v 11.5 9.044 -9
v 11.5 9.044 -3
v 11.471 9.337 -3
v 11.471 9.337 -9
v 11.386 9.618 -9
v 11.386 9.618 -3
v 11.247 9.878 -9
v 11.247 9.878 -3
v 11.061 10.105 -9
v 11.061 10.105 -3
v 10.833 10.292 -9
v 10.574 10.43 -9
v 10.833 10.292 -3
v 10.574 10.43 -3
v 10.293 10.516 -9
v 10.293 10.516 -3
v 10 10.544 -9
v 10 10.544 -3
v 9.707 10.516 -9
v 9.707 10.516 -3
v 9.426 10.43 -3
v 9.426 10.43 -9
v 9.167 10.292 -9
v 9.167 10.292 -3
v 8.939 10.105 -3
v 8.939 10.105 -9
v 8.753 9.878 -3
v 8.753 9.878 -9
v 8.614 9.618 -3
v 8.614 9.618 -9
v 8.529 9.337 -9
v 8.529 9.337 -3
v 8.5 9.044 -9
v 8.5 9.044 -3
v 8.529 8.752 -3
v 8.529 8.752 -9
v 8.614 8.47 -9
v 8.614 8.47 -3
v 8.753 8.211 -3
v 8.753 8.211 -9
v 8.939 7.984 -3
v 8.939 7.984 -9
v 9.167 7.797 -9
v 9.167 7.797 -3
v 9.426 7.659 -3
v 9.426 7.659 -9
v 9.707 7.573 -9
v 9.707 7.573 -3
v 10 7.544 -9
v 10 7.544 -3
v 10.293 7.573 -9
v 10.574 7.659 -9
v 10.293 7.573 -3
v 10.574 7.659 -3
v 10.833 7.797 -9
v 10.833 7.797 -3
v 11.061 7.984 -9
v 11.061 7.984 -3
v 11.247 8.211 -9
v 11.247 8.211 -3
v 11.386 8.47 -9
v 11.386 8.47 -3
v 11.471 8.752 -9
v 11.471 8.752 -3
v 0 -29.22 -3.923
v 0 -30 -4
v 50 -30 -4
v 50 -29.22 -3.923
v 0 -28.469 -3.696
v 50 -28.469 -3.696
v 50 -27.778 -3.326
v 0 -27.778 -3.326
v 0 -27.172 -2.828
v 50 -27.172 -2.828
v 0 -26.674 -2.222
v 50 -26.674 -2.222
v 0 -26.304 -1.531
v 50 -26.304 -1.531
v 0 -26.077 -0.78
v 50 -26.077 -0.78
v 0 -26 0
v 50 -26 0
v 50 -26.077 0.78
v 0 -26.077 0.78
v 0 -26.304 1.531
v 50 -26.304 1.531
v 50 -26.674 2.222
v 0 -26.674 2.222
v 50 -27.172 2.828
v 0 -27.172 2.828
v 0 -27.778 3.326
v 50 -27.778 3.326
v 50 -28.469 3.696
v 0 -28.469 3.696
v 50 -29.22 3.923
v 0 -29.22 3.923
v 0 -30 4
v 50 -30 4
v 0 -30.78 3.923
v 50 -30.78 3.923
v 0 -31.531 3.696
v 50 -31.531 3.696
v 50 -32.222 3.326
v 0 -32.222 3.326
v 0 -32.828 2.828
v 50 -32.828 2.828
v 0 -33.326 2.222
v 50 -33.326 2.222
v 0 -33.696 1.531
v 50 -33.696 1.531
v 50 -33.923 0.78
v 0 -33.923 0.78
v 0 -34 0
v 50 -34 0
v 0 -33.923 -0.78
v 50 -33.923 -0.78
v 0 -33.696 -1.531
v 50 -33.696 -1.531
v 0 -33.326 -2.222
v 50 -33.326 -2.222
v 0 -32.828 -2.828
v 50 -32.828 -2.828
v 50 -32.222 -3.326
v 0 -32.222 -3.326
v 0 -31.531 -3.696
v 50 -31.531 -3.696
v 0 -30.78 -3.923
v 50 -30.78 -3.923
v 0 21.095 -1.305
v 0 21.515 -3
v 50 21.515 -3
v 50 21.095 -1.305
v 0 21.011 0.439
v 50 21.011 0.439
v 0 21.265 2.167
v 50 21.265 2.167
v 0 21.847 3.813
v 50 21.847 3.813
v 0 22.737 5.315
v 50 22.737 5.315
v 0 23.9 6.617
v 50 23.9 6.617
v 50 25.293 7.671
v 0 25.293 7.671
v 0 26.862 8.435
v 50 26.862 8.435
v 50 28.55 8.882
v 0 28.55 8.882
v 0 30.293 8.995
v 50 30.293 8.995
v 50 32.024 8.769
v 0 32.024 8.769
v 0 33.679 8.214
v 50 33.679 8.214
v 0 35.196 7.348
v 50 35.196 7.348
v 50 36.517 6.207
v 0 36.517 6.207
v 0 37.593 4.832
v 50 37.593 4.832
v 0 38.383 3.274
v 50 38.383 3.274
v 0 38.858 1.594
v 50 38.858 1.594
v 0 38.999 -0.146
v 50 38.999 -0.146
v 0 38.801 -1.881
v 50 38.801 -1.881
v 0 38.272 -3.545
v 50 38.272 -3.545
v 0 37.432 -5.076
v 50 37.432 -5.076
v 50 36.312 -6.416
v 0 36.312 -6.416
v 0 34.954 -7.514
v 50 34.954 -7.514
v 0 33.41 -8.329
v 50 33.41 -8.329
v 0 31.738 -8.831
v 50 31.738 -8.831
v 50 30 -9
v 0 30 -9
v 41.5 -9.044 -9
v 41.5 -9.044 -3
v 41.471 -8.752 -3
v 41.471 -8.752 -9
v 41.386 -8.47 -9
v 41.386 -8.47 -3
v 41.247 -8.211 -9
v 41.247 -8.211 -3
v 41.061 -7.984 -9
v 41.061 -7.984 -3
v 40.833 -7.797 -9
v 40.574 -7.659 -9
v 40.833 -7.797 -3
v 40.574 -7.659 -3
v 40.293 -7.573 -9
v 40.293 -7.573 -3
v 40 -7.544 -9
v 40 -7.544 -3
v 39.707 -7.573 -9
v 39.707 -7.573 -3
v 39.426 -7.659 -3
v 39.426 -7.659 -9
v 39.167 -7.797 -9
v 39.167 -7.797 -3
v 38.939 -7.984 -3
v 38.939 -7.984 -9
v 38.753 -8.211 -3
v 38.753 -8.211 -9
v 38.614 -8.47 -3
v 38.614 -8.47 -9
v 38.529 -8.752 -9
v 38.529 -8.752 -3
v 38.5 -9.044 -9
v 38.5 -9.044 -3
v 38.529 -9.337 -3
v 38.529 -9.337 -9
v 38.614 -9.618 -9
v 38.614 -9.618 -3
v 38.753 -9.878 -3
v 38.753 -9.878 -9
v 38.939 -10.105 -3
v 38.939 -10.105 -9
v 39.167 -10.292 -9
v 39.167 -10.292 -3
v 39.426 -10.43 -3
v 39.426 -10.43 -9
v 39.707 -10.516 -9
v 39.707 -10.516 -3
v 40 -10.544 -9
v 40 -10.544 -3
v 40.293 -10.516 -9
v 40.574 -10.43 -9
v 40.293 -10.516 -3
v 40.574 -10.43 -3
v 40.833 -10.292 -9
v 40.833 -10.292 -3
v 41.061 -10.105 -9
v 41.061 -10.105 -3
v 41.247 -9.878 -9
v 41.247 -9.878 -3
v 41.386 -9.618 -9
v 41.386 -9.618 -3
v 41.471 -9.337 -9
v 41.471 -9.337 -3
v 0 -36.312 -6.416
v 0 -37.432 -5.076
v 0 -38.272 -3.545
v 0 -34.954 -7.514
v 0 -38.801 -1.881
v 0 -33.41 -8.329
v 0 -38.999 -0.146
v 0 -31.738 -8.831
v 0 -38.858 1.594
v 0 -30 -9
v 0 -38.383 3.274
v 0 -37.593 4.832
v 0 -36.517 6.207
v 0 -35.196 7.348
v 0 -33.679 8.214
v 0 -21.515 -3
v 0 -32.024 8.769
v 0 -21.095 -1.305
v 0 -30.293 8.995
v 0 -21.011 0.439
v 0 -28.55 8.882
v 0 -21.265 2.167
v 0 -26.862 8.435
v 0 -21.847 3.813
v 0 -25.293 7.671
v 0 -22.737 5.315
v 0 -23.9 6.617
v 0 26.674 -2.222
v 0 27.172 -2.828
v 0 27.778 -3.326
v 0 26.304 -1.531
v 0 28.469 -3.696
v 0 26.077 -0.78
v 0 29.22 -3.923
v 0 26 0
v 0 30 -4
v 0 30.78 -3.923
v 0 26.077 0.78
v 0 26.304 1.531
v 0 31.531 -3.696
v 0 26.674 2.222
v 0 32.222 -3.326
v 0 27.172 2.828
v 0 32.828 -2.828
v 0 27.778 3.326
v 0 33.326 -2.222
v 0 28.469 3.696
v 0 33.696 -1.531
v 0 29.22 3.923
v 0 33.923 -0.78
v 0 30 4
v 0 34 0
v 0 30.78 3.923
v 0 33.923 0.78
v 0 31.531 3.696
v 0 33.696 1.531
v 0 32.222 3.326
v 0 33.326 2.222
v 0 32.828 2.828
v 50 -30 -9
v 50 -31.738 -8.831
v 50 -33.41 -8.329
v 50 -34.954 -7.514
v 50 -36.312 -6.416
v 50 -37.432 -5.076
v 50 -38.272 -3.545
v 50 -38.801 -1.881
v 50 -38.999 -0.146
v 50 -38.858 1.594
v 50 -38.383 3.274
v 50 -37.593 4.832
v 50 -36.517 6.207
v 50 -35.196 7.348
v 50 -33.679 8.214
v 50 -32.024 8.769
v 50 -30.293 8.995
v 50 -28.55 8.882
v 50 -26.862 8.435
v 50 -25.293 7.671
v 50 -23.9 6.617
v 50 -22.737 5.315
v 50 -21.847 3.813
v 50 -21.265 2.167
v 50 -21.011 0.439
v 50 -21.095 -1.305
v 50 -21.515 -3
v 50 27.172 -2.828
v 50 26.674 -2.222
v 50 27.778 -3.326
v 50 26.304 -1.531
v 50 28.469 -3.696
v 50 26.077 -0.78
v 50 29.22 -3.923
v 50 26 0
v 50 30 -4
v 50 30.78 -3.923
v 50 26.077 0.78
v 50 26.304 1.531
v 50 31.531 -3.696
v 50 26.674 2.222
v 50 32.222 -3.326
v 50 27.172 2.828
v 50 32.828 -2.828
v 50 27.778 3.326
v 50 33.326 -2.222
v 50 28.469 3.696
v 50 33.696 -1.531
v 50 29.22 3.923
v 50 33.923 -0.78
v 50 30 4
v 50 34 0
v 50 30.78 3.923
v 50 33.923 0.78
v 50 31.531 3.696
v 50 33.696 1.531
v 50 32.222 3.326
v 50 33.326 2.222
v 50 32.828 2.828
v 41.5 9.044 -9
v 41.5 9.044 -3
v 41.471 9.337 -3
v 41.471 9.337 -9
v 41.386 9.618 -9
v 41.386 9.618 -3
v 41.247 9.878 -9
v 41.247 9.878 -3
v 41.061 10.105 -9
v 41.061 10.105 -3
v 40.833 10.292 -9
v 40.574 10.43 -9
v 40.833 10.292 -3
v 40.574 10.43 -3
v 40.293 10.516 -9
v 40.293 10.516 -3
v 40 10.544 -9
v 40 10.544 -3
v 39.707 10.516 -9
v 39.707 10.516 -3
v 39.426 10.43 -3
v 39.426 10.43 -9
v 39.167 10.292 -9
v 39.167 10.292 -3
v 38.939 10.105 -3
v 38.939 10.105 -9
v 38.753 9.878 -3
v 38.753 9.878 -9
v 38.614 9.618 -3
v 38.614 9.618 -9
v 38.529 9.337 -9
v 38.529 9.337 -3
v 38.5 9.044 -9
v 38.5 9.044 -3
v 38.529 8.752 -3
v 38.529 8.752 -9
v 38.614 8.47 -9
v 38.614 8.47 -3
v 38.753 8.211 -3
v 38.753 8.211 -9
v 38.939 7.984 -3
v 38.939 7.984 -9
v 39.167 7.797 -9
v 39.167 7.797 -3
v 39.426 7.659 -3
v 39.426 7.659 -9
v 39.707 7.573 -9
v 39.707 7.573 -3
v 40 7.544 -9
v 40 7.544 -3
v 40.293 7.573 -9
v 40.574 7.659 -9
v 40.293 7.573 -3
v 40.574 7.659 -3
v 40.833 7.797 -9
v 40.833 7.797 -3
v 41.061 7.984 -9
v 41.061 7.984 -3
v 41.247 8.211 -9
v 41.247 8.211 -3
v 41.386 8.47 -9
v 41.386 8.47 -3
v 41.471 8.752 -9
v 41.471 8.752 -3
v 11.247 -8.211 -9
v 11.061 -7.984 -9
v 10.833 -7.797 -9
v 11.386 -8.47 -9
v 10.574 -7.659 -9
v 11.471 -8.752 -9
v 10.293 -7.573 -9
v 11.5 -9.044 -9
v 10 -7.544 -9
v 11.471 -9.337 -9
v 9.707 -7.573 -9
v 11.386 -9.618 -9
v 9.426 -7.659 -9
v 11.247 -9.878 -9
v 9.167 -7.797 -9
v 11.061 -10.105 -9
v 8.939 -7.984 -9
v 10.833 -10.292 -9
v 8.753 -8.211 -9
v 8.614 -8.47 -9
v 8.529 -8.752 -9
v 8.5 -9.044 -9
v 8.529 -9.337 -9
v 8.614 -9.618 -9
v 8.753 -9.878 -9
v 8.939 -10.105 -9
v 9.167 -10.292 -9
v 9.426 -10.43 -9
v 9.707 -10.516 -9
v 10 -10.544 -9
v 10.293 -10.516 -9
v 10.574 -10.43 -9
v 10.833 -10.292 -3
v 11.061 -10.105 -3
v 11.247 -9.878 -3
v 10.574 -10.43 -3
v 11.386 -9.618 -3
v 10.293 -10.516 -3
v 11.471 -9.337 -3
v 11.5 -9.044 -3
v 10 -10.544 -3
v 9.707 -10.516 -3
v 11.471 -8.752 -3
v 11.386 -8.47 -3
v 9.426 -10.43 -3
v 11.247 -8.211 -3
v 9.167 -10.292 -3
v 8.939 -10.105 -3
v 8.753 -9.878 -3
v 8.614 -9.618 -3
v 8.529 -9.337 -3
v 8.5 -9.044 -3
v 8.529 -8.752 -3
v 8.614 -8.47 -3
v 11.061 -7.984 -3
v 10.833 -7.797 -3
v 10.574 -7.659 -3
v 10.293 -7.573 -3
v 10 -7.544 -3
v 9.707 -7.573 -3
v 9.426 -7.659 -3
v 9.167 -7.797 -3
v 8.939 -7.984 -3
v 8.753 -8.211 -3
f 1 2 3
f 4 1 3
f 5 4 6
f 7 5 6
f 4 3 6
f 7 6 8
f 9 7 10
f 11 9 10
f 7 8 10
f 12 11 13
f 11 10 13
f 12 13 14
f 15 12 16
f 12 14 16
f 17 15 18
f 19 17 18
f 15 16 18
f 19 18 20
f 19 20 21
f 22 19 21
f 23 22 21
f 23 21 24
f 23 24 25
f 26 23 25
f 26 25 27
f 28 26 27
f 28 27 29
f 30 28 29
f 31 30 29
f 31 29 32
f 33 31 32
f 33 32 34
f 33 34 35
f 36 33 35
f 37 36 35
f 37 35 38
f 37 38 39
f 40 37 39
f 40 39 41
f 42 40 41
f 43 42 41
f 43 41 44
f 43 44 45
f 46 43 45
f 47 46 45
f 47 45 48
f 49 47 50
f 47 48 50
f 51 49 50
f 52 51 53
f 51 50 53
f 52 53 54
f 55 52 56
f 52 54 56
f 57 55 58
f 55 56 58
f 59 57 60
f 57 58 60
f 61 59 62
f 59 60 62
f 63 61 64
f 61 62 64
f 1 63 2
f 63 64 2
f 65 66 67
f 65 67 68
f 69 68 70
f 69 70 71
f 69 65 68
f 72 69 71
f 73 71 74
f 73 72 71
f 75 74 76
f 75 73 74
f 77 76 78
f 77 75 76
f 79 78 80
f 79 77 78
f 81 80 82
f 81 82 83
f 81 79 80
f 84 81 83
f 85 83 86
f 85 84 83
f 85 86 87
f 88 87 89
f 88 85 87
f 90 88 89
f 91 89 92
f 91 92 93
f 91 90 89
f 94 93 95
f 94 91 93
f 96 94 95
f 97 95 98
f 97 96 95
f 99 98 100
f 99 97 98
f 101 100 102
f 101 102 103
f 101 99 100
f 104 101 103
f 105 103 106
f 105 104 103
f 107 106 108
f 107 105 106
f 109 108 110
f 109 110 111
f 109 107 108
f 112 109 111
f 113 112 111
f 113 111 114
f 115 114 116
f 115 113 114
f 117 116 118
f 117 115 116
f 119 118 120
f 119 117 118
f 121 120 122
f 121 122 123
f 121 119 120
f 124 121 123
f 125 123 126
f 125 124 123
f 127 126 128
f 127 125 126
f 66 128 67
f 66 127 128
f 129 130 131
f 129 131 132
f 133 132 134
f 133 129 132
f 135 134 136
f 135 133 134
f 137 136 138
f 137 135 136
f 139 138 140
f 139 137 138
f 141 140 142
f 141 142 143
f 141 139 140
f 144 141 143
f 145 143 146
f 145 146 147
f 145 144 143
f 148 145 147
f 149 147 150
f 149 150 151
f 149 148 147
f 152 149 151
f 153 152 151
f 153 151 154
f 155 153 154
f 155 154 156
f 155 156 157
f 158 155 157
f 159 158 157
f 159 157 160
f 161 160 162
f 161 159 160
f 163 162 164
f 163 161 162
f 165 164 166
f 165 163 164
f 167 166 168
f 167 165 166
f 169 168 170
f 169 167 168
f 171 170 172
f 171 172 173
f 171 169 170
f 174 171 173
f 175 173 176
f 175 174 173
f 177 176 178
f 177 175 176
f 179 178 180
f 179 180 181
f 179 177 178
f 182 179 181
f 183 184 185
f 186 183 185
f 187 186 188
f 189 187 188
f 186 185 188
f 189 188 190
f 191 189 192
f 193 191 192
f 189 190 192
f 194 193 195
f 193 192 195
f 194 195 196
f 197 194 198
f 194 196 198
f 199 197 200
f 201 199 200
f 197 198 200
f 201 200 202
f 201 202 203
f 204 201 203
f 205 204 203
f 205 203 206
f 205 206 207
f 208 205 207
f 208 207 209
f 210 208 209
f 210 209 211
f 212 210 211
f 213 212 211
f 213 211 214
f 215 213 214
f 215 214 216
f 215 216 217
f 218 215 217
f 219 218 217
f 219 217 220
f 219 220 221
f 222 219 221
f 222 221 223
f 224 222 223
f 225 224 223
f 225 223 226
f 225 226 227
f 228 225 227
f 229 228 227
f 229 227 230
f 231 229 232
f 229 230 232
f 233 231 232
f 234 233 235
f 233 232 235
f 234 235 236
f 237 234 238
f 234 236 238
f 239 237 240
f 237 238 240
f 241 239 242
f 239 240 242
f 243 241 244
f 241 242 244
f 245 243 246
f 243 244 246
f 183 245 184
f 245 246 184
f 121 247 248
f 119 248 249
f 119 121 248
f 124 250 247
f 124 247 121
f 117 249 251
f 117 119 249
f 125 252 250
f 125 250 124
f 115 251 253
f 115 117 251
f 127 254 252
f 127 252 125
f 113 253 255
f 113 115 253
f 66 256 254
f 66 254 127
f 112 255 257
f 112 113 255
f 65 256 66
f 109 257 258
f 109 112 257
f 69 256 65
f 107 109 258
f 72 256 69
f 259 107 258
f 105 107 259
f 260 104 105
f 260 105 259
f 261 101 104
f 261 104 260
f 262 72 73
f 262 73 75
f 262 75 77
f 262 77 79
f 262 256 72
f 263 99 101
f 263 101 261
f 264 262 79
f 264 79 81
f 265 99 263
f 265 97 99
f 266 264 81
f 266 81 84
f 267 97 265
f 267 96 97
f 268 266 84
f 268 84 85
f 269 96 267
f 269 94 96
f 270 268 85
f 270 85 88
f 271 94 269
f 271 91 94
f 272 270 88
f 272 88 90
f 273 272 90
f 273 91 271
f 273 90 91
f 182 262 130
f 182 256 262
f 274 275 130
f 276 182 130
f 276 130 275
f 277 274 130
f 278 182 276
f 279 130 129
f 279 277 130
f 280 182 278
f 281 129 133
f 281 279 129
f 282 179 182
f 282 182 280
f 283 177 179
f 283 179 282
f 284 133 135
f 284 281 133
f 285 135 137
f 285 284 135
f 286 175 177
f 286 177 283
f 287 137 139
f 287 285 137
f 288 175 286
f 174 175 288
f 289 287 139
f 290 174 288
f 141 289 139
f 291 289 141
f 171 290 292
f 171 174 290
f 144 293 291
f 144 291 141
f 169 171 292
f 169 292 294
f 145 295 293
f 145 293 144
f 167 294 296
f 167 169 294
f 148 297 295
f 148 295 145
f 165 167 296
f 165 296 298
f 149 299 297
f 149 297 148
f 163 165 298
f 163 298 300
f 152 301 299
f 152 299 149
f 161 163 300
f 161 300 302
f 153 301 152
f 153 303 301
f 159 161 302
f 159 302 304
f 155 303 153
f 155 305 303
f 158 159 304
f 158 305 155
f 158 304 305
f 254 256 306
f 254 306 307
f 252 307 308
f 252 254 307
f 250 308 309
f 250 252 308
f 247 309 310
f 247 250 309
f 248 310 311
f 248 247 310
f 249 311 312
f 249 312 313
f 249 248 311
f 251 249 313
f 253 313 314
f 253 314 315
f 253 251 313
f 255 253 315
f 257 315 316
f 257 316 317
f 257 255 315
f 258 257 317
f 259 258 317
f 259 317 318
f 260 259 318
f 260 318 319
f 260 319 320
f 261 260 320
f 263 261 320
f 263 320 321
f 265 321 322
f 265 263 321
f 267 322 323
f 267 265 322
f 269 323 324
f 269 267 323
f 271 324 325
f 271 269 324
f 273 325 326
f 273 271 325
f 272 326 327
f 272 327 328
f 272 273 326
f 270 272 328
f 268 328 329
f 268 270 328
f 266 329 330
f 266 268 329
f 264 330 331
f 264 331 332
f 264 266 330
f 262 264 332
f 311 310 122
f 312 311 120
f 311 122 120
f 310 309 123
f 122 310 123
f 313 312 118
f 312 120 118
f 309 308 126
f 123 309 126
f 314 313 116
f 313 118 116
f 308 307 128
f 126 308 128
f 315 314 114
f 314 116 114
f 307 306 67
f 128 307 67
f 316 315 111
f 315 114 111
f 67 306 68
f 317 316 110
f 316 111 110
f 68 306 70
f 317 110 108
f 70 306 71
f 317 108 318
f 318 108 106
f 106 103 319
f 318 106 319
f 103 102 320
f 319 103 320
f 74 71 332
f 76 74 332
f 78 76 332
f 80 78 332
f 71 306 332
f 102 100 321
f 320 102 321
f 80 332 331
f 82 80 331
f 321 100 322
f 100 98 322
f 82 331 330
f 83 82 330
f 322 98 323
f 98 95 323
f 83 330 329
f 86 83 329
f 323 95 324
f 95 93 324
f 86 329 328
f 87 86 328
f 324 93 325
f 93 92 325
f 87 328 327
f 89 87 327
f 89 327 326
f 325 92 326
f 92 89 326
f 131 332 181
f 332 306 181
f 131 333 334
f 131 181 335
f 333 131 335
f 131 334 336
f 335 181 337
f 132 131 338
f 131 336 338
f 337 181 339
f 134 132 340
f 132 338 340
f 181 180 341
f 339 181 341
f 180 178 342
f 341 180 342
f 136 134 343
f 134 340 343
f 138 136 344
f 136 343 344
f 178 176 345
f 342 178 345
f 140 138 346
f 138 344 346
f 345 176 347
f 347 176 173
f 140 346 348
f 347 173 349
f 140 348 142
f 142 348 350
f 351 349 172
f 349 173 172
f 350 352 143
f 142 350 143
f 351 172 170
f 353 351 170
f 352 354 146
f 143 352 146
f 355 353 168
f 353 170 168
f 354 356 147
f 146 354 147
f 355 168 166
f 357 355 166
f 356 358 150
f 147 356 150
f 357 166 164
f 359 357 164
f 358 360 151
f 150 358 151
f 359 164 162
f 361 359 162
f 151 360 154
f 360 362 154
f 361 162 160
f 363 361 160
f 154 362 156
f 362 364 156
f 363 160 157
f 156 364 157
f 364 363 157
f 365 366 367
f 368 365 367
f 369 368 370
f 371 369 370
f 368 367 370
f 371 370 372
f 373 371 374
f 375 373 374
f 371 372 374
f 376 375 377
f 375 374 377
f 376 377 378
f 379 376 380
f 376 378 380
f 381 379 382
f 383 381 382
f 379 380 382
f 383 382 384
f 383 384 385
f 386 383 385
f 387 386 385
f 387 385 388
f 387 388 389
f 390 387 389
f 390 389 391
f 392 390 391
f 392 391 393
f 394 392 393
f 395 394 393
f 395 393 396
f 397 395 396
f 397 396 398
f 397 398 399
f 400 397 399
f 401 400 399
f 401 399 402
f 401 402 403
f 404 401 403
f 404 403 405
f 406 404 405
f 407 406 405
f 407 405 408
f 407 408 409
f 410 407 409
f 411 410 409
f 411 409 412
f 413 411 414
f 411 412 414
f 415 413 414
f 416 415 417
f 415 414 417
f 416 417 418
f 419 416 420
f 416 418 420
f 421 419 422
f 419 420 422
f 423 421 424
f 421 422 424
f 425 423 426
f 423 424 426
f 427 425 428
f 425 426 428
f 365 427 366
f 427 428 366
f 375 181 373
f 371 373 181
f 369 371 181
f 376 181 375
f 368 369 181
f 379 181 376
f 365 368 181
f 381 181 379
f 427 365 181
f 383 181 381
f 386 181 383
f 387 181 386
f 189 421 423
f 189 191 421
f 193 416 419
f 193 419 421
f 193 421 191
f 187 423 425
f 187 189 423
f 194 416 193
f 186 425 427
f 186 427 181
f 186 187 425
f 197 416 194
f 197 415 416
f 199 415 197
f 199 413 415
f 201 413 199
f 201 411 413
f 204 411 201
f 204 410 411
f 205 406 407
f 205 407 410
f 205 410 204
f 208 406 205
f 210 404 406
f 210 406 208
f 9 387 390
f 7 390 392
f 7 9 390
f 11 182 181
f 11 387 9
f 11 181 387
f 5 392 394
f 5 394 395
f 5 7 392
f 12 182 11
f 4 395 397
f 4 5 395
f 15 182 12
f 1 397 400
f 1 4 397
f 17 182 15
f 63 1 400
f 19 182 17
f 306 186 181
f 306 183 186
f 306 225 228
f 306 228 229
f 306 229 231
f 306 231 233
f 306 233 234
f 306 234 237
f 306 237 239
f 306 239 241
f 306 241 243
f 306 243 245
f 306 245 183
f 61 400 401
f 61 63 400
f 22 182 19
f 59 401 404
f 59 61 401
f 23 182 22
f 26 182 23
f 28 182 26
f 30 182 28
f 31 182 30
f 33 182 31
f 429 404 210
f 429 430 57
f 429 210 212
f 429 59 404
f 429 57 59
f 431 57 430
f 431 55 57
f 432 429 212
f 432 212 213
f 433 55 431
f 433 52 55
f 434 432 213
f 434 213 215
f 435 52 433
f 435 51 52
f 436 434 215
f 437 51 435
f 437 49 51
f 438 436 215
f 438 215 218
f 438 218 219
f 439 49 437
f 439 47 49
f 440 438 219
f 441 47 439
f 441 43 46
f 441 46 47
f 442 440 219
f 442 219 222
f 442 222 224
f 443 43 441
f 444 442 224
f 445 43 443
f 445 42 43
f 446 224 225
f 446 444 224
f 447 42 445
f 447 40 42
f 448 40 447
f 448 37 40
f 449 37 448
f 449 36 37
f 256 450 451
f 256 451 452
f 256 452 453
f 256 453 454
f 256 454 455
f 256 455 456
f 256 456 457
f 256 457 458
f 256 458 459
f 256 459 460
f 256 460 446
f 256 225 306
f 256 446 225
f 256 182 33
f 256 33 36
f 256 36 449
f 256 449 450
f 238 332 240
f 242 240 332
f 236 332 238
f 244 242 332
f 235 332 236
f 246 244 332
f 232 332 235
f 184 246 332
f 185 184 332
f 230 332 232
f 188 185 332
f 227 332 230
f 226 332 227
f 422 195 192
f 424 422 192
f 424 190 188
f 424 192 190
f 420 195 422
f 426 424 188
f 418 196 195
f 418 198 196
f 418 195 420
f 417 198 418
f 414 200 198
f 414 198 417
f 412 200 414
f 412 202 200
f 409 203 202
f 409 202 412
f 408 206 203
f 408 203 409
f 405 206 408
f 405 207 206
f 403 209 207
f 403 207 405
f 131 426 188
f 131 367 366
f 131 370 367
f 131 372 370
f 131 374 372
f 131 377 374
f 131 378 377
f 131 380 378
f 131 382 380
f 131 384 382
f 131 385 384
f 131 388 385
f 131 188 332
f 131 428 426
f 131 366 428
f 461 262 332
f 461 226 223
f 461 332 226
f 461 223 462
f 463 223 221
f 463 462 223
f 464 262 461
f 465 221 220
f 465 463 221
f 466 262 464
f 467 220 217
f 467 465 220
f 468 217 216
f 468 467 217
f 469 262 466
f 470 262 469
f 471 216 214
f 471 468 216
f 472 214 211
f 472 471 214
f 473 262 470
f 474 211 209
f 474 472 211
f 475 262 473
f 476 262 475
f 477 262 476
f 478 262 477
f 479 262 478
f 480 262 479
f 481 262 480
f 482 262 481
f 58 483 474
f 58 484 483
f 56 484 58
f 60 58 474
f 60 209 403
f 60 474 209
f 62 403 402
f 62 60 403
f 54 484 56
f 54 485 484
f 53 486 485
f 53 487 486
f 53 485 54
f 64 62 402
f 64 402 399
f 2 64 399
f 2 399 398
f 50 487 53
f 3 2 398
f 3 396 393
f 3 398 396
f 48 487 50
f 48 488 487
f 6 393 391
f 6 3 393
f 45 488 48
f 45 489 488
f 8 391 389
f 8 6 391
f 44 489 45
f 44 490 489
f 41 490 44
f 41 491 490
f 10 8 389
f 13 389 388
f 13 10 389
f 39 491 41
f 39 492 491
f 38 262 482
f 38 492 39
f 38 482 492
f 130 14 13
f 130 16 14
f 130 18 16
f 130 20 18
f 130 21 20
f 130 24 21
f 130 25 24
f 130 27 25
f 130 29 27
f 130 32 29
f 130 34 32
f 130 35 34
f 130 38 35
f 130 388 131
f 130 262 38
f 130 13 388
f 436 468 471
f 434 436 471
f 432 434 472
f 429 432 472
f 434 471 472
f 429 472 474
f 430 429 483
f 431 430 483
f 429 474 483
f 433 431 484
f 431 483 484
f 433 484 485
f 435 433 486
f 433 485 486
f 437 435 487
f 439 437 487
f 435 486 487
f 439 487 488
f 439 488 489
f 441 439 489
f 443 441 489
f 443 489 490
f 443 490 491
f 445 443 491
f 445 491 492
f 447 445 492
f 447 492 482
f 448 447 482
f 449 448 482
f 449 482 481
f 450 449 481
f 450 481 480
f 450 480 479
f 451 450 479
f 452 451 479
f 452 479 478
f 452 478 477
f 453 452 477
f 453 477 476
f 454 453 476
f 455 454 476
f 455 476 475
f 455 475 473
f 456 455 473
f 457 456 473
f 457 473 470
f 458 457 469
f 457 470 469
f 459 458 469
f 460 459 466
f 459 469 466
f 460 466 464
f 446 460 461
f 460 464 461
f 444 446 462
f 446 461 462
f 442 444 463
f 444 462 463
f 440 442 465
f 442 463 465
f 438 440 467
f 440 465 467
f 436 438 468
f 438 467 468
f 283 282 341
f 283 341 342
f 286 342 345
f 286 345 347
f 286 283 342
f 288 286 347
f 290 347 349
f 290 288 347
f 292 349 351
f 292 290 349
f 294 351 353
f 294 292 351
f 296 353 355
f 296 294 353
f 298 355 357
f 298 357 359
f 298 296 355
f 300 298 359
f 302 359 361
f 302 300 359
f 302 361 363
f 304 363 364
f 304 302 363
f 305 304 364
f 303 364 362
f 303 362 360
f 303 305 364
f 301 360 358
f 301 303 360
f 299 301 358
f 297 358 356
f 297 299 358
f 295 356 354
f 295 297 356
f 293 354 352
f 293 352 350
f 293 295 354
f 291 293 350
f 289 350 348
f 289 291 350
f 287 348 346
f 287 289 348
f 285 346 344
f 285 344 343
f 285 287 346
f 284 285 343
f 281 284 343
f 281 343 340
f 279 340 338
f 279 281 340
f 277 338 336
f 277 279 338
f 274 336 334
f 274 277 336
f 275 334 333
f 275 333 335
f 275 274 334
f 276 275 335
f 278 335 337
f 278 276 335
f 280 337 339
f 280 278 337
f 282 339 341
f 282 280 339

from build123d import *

# Parameters (mm, degrees)
ESBO_O2_R                = 4
RESSALTO_EXTRUS_O1_DEPTH = 50
ESBO_O5_R                = 1.5
CORTE_EXTRUS_O2_DEPTH    = 40


with BuildPart() as part:
    # Esboço2 → Ressalto-extrusão1 (new body)
    with BuildSketch(Plane(origin=(0, 0, 0), x_dir=(0, 0, -1), z_dir=(1, 0, 0))):
        with BuildLine():
            Line((9, 30), (9, -30))
            ThreePointArc((9, -30), (-7.348469228, -35.196152423), (3, -21.514718626))
            Line((3, -21.514718626), (3, 21.514718626))
            ThreePointArc((3, 21.514718626), (-7.348469228, 35.196152423), (9, 30))
        make_face()
        with Locations((0, 30)):
            Circle(ESBO_O2_R, mode=Mode.SUBTRACT)
        with Locations((0, -30)):
            Circle(ESBO_O2_R, mode=Mode.SUBTRACT)
    extrude(amount=RESSALTO_EXTRUS_O1_DEPTH)

    # Esboço5 → Corte-extrusão2 (cut)
    with BuildSketch(Plane.XY.offset(-3)):
        with Locations((10, 9.044428523)):
            Circle(ESBO_O5_R)
        with Locations((40, 9.044428523)):
            Circle(ESBO_O5_R)
        with Locations((40, -9.044428523)):
            Circle(ESBO_O5_R)
        with Locations((10, -9.044428523)):
            Circle(ESBO_O5_R)
    extrude(amount=-CORTE_EXTRUS_O2_DEPTH, mode=Mode.SUBTRACT)


solid = part.part
